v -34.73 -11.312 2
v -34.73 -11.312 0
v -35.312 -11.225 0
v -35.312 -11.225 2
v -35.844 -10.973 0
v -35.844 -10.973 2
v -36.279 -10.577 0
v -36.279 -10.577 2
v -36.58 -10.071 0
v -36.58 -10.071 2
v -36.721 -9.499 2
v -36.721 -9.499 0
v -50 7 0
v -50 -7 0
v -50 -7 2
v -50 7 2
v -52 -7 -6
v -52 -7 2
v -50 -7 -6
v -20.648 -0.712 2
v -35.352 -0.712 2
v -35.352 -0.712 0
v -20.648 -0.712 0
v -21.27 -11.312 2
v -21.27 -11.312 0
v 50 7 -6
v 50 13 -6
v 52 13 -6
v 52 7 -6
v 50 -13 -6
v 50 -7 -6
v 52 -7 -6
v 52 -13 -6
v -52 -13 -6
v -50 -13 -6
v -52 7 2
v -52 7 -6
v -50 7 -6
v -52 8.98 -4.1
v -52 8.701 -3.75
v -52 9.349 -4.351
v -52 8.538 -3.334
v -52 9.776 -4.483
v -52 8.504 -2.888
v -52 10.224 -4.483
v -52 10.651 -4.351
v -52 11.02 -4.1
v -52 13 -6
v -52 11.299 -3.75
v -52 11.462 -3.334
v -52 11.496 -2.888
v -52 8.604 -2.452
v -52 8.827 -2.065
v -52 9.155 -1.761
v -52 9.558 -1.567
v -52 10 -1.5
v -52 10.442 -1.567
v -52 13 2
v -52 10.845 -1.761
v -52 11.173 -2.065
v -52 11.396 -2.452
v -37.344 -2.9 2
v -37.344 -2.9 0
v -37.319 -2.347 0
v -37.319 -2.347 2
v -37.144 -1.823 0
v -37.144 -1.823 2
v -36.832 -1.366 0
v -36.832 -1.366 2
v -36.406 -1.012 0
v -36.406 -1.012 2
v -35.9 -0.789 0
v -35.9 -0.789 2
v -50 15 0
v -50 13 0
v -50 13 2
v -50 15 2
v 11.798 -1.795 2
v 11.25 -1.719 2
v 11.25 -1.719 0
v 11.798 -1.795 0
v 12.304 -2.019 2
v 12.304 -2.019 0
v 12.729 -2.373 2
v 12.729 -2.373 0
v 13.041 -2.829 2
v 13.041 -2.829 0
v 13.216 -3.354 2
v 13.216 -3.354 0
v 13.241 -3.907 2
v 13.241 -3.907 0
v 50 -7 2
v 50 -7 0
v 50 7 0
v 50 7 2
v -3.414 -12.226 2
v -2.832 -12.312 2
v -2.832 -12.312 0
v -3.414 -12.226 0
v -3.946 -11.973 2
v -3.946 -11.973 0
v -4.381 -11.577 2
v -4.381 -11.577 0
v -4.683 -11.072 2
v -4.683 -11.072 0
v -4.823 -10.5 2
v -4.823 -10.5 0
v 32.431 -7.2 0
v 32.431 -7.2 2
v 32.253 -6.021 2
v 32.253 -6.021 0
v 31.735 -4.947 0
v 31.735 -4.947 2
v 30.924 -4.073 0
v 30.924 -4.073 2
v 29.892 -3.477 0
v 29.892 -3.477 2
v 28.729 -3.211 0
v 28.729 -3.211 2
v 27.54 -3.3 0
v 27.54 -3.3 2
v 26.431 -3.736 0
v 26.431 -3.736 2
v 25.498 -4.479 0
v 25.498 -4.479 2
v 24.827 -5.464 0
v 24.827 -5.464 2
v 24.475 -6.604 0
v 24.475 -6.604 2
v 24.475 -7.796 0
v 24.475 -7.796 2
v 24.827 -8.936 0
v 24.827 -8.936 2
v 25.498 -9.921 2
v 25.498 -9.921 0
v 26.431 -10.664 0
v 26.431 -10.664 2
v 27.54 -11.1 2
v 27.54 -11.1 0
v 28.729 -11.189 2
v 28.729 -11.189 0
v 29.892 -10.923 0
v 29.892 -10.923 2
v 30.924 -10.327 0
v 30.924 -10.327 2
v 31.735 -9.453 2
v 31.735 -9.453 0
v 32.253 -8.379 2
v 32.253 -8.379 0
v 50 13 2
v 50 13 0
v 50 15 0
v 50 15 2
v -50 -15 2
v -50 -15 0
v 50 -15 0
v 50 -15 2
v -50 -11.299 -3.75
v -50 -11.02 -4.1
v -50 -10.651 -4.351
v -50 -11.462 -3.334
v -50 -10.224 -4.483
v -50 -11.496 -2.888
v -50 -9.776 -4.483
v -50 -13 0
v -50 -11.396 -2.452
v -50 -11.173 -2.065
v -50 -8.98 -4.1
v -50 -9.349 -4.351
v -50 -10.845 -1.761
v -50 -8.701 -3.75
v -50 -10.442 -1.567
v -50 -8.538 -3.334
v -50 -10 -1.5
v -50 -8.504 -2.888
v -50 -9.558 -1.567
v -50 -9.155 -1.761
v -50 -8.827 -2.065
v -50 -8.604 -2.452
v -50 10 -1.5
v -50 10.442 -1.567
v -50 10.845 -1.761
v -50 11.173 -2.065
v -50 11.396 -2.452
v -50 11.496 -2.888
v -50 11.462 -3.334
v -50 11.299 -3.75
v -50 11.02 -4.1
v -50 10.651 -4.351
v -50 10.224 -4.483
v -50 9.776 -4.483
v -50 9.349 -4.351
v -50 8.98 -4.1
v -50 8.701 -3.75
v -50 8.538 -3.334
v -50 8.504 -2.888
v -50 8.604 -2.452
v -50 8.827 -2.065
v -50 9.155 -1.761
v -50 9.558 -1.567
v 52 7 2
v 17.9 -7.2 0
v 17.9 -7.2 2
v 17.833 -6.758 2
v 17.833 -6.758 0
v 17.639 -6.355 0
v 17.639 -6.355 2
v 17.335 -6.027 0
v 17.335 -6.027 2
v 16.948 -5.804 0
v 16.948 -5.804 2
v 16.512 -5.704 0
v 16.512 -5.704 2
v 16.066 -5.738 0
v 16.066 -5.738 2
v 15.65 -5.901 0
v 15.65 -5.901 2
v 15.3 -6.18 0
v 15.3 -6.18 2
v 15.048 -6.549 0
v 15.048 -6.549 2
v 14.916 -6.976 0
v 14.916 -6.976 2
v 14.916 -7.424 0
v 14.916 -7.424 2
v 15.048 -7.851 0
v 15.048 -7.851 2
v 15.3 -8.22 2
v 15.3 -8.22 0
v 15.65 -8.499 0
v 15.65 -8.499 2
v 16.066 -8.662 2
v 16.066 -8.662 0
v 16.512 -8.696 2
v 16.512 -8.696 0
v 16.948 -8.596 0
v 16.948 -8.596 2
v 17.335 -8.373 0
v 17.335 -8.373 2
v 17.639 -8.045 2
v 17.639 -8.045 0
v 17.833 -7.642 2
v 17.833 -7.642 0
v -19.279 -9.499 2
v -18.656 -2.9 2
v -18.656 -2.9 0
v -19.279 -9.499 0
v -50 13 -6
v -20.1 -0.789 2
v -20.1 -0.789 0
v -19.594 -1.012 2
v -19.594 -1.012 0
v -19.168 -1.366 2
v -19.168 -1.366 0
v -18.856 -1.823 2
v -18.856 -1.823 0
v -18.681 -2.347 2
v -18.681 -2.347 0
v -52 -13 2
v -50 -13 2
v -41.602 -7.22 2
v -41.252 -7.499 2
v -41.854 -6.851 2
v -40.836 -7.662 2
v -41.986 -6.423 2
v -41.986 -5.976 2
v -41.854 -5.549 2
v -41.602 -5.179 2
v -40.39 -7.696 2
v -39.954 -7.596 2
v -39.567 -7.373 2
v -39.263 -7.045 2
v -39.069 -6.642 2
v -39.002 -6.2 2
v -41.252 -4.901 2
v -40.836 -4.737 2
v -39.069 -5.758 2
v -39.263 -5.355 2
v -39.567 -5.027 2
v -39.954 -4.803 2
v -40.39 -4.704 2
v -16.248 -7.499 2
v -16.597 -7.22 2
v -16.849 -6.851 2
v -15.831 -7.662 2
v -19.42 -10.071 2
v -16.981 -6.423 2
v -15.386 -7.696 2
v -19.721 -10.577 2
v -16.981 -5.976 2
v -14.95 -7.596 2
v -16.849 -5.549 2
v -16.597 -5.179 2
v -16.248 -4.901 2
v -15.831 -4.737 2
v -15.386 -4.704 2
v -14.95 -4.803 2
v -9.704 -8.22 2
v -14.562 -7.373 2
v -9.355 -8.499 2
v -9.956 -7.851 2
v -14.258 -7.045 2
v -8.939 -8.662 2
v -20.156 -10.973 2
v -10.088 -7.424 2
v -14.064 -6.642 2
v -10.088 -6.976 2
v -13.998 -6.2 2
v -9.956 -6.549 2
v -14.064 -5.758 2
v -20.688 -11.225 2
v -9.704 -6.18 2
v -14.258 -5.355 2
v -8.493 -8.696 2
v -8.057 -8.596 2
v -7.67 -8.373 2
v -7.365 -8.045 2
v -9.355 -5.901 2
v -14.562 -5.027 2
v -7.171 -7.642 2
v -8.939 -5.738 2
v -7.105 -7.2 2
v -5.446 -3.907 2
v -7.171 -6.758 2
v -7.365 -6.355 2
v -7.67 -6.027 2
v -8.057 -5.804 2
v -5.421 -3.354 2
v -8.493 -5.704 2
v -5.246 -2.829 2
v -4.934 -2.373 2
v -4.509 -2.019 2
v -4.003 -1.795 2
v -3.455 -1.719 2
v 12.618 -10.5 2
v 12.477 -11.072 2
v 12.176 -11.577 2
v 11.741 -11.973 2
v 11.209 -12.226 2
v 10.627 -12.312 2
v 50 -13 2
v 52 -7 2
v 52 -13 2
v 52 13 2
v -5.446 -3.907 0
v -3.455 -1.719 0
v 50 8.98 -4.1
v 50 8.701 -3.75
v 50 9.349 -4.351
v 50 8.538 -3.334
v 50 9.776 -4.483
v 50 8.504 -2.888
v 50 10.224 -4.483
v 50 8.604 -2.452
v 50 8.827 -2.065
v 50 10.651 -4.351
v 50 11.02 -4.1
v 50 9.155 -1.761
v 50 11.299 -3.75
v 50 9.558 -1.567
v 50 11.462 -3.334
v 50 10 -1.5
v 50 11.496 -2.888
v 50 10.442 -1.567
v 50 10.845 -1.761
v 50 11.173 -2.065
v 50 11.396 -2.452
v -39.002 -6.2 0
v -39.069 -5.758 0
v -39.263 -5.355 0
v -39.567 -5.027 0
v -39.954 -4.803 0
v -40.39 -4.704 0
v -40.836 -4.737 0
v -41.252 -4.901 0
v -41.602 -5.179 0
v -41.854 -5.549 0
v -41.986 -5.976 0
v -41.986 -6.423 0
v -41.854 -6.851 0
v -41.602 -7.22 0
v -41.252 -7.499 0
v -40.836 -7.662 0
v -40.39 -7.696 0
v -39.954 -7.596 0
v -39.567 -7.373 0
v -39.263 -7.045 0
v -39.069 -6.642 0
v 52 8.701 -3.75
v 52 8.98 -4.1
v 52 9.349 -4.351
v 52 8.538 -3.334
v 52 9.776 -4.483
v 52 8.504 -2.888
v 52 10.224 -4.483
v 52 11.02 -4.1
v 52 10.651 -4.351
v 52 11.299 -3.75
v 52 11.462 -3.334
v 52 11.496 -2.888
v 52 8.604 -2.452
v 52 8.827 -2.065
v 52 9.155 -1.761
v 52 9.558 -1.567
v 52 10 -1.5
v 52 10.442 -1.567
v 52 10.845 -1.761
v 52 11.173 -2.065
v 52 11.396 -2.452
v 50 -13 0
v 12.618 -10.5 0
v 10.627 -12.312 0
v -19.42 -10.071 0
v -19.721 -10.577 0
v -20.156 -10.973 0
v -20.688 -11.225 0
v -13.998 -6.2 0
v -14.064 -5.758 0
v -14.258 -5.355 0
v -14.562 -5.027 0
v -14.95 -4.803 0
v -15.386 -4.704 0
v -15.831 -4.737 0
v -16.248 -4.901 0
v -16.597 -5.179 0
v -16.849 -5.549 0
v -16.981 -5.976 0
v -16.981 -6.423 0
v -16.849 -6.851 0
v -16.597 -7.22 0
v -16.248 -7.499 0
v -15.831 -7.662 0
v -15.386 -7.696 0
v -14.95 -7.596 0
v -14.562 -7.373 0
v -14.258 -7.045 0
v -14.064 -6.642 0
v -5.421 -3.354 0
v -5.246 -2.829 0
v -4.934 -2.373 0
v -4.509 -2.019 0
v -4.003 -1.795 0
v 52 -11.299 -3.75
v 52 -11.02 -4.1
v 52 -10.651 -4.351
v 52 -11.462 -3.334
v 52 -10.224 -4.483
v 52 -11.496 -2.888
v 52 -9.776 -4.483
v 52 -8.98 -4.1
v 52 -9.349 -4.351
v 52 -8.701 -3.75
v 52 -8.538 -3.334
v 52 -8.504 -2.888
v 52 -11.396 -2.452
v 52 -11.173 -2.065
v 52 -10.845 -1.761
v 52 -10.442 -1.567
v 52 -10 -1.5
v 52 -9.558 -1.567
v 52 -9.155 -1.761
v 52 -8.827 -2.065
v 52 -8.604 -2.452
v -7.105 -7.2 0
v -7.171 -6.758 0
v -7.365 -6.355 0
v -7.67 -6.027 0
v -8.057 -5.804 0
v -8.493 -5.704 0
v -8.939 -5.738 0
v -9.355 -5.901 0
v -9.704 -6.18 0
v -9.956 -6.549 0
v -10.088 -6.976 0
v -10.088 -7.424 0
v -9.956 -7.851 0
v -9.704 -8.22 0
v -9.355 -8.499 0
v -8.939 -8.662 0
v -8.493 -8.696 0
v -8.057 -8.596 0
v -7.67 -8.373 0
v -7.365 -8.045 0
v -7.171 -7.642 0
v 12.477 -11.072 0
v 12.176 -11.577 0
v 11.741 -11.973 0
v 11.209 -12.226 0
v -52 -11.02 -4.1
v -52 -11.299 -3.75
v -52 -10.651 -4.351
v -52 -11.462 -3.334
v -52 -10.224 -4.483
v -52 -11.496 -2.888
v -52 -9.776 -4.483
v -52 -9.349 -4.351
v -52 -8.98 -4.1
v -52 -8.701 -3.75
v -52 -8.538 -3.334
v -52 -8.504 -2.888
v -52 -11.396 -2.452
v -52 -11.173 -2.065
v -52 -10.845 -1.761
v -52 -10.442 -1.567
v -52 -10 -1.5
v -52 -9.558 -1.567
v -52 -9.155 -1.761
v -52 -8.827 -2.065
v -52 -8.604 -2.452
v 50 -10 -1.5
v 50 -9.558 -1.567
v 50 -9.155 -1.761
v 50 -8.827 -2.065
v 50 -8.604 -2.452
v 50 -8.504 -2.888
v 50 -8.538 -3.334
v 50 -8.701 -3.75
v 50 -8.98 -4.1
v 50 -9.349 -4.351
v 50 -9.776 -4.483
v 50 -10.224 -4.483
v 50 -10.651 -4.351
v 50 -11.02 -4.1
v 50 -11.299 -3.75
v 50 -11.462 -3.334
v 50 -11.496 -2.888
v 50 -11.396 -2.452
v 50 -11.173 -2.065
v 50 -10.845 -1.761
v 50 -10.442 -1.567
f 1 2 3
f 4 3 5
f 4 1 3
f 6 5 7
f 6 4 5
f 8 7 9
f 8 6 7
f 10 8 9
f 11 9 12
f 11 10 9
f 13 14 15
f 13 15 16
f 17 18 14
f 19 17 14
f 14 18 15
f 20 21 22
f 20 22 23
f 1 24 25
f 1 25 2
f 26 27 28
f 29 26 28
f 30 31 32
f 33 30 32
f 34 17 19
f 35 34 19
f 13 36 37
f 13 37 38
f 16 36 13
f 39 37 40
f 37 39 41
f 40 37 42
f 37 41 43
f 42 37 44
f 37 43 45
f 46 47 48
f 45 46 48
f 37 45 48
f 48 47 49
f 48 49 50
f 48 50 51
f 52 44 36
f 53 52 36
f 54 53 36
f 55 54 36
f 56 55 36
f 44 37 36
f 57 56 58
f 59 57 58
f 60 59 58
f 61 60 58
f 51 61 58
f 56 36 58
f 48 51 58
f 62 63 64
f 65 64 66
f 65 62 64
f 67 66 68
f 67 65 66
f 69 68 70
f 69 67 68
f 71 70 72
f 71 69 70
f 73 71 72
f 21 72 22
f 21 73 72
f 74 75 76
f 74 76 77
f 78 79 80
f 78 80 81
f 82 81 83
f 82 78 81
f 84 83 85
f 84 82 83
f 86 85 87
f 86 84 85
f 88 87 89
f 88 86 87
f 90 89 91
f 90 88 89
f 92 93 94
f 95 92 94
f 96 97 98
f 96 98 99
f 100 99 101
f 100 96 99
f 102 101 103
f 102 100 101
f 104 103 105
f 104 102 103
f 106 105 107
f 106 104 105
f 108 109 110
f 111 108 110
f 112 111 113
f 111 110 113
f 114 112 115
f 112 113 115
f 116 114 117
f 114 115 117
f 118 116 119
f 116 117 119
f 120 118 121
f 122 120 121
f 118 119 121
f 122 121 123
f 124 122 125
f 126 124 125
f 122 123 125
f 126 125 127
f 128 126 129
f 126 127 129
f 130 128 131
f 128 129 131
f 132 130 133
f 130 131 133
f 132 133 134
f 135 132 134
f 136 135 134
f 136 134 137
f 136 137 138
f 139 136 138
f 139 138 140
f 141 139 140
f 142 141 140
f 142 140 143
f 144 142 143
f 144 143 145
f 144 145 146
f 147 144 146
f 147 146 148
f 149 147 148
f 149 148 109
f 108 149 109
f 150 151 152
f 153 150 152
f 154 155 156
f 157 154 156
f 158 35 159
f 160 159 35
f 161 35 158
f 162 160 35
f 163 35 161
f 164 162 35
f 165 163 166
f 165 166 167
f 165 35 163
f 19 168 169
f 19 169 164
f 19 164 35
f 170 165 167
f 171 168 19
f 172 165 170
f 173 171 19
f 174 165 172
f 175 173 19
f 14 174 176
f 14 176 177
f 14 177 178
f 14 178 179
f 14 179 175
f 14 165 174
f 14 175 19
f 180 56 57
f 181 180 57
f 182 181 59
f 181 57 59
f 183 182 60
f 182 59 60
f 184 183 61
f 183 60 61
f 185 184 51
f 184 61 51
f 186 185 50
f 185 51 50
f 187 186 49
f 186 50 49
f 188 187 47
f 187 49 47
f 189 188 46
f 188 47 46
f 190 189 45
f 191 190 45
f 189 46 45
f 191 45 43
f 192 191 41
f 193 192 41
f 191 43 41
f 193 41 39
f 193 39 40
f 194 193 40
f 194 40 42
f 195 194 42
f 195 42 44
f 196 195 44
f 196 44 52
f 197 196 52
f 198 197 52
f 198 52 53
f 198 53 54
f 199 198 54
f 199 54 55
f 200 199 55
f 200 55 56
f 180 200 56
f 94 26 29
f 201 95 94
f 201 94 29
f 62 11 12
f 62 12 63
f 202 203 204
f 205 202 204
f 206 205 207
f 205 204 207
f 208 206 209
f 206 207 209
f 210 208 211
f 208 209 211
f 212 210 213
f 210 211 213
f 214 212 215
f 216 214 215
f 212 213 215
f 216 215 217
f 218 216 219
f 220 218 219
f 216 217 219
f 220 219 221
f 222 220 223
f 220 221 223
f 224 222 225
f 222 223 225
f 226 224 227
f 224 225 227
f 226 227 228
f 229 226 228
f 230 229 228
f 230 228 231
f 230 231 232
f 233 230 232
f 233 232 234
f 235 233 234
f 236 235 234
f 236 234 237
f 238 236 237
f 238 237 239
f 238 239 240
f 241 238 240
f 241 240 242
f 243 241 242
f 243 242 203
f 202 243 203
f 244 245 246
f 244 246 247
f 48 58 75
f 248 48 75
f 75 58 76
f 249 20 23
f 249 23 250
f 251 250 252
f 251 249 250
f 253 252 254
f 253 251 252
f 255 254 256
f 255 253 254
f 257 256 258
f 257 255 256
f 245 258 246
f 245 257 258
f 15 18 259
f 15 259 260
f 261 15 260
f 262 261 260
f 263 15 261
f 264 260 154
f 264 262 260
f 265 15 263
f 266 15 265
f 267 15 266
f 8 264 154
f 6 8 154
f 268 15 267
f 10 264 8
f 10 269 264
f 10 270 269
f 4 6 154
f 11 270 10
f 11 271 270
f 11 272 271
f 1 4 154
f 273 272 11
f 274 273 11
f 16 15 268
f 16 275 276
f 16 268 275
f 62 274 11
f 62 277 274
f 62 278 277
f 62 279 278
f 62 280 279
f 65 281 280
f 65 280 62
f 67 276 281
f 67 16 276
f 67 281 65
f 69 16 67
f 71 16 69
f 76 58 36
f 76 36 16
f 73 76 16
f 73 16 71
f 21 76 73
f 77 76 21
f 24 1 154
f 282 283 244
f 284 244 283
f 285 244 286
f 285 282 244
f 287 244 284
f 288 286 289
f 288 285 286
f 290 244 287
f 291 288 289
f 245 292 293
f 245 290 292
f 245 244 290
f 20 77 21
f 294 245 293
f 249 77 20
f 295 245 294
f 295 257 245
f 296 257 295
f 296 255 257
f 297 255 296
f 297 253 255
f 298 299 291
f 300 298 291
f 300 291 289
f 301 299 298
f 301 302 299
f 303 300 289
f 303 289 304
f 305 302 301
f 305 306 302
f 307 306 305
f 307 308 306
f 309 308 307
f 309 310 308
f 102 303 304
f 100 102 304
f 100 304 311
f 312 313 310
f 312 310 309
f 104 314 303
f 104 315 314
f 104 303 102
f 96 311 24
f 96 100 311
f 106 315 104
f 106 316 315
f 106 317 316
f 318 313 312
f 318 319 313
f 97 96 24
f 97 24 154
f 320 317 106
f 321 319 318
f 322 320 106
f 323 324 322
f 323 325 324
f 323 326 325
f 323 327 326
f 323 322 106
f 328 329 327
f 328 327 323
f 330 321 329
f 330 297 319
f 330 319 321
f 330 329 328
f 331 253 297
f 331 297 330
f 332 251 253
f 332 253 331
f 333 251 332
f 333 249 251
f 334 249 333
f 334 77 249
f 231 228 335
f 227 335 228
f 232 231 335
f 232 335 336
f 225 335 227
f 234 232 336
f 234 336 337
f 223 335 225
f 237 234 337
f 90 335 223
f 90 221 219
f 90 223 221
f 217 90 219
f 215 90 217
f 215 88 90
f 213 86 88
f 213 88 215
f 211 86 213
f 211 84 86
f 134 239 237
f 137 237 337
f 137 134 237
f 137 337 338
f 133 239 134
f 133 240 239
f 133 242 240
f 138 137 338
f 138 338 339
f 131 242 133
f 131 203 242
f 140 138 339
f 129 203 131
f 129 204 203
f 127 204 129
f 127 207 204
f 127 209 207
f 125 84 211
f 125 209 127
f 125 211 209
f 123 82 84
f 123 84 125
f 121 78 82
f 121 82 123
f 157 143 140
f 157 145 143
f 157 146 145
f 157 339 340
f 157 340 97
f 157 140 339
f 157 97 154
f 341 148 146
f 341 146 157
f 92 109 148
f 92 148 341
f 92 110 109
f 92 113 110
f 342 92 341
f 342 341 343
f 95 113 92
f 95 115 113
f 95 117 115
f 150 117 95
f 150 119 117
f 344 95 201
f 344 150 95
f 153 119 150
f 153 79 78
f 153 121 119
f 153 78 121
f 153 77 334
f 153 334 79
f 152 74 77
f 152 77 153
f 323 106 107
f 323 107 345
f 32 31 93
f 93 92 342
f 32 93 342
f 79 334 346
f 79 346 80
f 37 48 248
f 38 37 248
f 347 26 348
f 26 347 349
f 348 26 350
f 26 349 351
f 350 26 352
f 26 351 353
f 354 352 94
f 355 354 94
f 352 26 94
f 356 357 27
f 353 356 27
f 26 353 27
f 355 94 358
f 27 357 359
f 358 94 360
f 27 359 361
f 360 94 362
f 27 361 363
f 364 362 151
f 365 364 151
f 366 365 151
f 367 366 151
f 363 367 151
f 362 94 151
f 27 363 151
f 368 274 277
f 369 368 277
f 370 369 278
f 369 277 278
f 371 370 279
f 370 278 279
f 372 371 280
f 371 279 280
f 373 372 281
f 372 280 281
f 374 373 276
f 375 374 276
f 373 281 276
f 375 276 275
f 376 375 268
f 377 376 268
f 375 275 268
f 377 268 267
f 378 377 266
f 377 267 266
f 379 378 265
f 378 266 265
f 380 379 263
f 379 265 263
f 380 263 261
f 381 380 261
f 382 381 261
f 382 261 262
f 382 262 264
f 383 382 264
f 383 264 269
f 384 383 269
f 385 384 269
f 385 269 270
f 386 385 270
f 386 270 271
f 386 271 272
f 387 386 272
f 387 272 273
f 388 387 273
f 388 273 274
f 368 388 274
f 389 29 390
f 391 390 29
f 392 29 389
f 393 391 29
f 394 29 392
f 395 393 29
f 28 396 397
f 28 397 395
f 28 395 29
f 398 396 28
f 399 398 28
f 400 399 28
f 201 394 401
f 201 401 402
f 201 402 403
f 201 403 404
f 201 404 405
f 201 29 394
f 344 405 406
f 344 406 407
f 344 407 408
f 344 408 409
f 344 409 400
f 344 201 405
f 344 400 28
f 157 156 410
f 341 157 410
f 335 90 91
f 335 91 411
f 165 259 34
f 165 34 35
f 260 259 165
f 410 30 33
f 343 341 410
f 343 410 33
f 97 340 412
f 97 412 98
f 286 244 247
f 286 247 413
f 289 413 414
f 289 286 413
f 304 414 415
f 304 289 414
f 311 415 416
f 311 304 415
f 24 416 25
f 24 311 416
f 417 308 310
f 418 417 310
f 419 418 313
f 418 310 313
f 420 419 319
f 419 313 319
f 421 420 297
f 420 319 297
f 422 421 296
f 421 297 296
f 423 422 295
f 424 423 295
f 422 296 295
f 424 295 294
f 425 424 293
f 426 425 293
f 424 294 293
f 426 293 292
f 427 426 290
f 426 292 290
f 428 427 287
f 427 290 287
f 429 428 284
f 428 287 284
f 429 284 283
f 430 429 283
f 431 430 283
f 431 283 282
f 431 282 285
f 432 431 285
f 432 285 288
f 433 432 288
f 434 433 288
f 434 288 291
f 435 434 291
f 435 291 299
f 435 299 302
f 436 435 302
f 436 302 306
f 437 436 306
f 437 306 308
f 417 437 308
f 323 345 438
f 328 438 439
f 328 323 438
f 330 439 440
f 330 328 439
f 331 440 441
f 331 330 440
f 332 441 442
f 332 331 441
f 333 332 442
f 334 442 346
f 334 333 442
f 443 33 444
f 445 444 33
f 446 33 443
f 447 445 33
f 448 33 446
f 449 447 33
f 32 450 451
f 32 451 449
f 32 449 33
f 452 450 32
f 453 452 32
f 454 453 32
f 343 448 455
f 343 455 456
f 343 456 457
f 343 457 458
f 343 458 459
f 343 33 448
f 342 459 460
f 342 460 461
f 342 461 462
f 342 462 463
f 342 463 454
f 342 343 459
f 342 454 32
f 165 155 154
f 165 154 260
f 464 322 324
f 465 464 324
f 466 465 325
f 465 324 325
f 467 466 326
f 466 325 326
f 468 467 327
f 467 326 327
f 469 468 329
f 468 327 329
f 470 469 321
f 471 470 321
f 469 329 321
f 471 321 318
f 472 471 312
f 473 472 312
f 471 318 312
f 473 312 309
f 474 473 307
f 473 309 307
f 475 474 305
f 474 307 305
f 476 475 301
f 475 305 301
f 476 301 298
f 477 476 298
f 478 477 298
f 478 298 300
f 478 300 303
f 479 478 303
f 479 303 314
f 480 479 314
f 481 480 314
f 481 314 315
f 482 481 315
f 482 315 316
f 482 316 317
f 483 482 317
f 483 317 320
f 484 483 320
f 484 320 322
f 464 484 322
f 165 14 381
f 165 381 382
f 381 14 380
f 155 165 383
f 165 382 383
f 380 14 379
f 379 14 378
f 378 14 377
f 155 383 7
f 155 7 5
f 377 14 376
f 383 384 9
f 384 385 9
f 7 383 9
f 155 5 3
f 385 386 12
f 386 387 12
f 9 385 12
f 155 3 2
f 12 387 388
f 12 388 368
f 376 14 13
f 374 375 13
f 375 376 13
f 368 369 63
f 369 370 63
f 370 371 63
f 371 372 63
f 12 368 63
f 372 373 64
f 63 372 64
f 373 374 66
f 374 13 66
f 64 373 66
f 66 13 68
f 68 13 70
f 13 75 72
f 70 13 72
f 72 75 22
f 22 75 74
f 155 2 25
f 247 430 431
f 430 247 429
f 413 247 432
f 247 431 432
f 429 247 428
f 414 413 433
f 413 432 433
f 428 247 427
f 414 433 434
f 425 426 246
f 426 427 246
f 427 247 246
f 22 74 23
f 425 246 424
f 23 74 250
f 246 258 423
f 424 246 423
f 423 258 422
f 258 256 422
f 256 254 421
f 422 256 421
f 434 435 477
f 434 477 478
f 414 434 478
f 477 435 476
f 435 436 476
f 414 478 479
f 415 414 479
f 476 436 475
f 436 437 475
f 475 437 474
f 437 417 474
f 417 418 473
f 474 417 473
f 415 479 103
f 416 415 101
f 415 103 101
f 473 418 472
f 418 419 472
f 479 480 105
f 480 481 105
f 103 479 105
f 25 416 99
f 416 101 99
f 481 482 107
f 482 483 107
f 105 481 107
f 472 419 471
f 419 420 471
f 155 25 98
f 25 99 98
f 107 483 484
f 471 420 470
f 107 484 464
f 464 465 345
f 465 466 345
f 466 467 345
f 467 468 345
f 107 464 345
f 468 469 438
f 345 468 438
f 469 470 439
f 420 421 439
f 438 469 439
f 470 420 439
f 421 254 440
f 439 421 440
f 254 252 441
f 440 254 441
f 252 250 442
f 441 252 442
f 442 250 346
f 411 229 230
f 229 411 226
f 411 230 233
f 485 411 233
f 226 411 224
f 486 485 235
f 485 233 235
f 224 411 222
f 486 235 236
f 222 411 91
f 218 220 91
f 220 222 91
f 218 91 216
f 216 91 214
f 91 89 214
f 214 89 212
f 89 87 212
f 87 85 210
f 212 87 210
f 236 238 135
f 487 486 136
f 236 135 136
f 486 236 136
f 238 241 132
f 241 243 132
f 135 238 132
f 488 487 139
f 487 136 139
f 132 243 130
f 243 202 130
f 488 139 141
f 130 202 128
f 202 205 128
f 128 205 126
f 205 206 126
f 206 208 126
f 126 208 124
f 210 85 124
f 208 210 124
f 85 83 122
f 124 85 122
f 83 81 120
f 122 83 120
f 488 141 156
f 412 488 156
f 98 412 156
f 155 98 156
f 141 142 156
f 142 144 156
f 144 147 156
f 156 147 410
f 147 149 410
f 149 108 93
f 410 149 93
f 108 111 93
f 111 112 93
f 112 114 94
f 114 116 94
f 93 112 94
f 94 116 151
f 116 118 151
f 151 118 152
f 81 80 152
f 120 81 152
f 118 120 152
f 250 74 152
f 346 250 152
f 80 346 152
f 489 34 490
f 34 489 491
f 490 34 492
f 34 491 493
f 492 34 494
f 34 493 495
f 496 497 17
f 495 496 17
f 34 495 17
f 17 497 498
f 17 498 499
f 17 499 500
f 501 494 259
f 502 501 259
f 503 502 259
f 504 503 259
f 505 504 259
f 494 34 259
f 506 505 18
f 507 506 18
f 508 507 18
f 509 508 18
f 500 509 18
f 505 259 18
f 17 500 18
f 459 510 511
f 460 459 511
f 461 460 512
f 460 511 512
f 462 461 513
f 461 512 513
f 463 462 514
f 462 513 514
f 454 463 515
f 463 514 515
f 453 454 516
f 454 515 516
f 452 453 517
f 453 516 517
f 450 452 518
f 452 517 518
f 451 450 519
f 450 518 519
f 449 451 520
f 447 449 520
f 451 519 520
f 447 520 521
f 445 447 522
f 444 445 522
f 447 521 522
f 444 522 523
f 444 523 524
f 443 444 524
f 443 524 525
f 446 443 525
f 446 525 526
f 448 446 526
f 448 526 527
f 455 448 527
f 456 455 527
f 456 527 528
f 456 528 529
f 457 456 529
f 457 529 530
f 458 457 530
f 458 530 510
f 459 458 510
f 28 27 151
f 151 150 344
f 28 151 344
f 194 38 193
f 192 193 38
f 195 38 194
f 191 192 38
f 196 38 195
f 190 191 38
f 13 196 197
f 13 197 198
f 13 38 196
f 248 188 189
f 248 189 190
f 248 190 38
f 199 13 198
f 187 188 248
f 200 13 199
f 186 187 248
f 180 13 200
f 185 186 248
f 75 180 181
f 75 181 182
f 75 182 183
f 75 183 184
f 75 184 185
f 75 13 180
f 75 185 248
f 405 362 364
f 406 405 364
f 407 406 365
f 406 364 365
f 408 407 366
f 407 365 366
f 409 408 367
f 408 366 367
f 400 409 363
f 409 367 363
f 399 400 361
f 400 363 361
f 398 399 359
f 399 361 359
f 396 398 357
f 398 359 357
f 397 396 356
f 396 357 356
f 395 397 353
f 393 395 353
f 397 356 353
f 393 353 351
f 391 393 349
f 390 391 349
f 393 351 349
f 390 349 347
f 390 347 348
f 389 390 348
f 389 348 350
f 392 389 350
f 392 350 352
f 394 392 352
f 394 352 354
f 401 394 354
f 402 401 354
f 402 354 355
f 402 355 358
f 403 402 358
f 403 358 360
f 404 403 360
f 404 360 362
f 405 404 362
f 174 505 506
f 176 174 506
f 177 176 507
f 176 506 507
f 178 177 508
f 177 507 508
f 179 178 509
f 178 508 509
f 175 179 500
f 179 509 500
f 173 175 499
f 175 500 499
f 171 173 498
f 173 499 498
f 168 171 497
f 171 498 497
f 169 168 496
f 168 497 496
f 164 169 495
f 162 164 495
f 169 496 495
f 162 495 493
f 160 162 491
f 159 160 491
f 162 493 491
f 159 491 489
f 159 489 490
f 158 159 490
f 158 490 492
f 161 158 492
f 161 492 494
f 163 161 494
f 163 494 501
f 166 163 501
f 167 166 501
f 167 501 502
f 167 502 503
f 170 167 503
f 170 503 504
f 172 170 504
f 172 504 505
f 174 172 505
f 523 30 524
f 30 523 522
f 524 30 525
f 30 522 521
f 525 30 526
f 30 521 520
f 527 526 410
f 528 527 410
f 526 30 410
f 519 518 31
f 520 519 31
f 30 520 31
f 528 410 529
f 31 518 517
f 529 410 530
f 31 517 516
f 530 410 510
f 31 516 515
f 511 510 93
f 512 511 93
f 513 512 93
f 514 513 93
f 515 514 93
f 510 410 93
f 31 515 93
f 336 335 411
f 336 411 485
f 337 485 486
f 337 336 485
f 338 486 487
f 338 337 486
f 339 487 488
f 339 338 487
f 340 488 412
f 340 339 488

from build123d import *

# Parameters (mm, degrees)
SKETCH1_W           = 100
SKETCH1_H           = 30
BOSS_EXTRUDE1_DEPTH = 2
SKETCH2_W           = 2
SKETCH2_H           = 6
BOSS_EXTRUDE2_DEPTH = 8
SKETCH3_R           = 1.5
CUT_EXTRUDE1_DEPTH  = 105
CUT_EXTRUDE2_REACH  = 10
SKETCH4_R           = 1.5
SKETCH4_R_2         = 4


with BuildPart() as part:
    # Sketch1 → Boss-Extrude1 (new body)
    with BuildSketch(Plane.XY):
        Rectangle(SKETCH1_W, SKETCH1_H)
    extrude(amount=BOSS_EXTRUDE1_DEPTH)

    # Sketch2 → Boss-Extrude2 (add)
    with BuildSketch(Plane.XY.offset(2)):
        with Locations((-51, 10)):
            Rectangle(SKETCH2_W, SKETCH2_H)
        with Locations((-51, -10)):
            Rectangle(SKETCH2_W, SKETCH2_H)
        with Locations((51, 10)):
            Rectangle(SKETCH2_W, SKETCH2_H)
        with Locations((51, -10)):
            Rectangle(SKETCH2_W, SKETCH2_H)
    extrude(amount=-BOSS_EXTRUDE2_DEPTH)

    # Sketch3 → Cut-Extrude1 (cut, through all)
    with BuildSketch(Plane.ZY.offset(52)):
        with Locations((-3, 10)):
            Circle(SKETCH3_R)
        with Locations((-3, -10)):
            Circle(SKETCH3_R)
    extrude(amount=-CUT_EXTRUDE1_DEPTH, mode=Mode.SUBTRACT)

    # Sketch4 → Cut-Extrude2 (cut, up to next)
    with BuildSketch(Plane.XY.offset(2), mode=Mode.PRIVATE) as cut_extrude2_sk1:
        with Locations((-40.502306205, -6.199754272)):
            Circle(SKETCH4_R)
    cut_extrude2_tool1 = extrude(cut_extrude2_sk1.sketch, amount=-CUT_EXTRUDE2_REACH, mode=Mode.PRIVATE) & part.part
    add(cut_extrude2_tool1.solids().sort_by_distance((-40.502306, -6.199754, 2))[0], mode=Mode.SUBTRACT)
    # Sketch4 → Cut-Extrude2 (cut, up to next)
    with BuildSketch(Plane.XY.offset(2), mode=Mode.PRIVATE) as cut_extrude2_sk2:
        with Locations((-15.497693795, -6.199754272)):
            Circle(SKETCH4_R)
    cut_extrude2_tool2 = extrude(cut_extrude2_sk2.sketch, amount=-CUT_EXTRUDE2_REACH, mode=Mode.PRIVATE) & part.part
    add(cut_extrude2_tool2.solids().sort_by_distance((-15.497694, -6.199754, 2))[0], mode=Mode.SUBTRACT)
    # Sketch4 → Cut-Extrude2 (cut, up to next)
    with BuildSketch(Plane.XY.offset(2), mode=Mode.PRIVATE) as cut_extrude2_sk3:
        with Locations((-8.604808795, -7.2)):
            Circle(SKETCH4_R)
    cut_extrude2_tool3 = extrude(cut_extrude2_sk3.sketch, amount=-CUT_EXTRUDE2_REACH, mode=Mode.PRIVATE) & part.part
    add(cut_extrude2_tool3.solids().sort_by_distance((-8.604809, -7.2, 2))[0], mode=Mode.SUBTRACT)
    # Sketch4 → Cut-Extrude2 (cut, up to next)
    with BuildSketch(Plane.XY.offset(2), mode=Mode.PRIVATE) as cut_extrude2_sk4:
        with Locations((16.399709937, -7.2)):
            Circle(SKETCH4_R)
    cut_extrude2_tool4 = extrude(cut_extrude2_sk4.sketch, amount=-CUT_EXTRUDE2_REACH, mode=Mode.PRIVATE) & part.part
    add(cut_extrude2_tool4.solids().sort_by_distance((16.39971, -7.2, 2))[0], mode=Mode.SUBTRACT)
    # Sketch4 → Cut-Extrude2 (cut, up to next)
    with BuildSketch(Plane.XY.offset(2), mode=Mode.PRIVATE) as cut_extrude2_sk5:
        with Locations((28.430538533, -7.2)):
            Circle(SKETCH4_R_2)
    cut_extrude2_tool5 = extrude(cut_extrude2_sk5.sketch, amount=-CUT_EXTRUDE2_REACH, mode=Mode.PRIVATE) & part.part
    add(cut_extrude2_tool5.solids().sort_by_distance((28.430539, -7.2, 2))[0], mode=Mode.SUBTRACT)
    # Sketch4 → Cut-Extrude2 (cut, up to next)
    with BuildSketch(Plane.XY.offset(2), mode=Mode.PRIVATE) as cut_extrude2_sk6:
        with BuildLine():
            Line((-35.352440505, -0.712200048), (-20.647559495, -0.712200048))
            ThreePointArc((-20.647559495, -0.712200048), (-19.168422859, -1.366037052), (-18.65640049, -2.900045237))
            Line((-18.65640049, -2.900045237), (-19.2789871, -9.499463306))
            ThreePointArc((-19.2789871, -9.499463306), (-19.92398311, -10.790754753), (-21.270146105, -11.311618117))
            Line((-21.270146105, -11.311618117), (-34.729853895, -11.311618117))
            ThreePointArc((-34.729853895, -11.311618117), (-36.07601689, -10.790754753), (-36.7210129, -9.499463306))
            Line((-36.7210129, -9.499463306), (-37.34359951, -2.900045237))
            ThreePointArc((-37.34359951, -2.900045237), (-36.831577141, -1.366037052), (-35.352440505, -0.712200048))
        make_face()
    cut_extrude2_tool6 = extrude(cut_extrude2_sk6.sketch, amount=-CUT_EXTRUDE2_REACH, mode=Mode.PRIVATE) & part.part
    add(cut_extrude2_tool6.solids().sort_by_distance((-28, -5.931102, 2))[0], mode=Mode.SUBTRACT)
    # Sketch4 → Cut-Extrude2 (cut, up to next)
    with BuildSketch(Plane.XY.offset(2), mode=Mode.PRIVATE) as cut_extrude2_sk7:
        with BuildLine():
            Line((-3.454989934, -1.718769673), (11.249891076, -1.718769673))
            ThreePointArc((11.249891076, -1.718769673), (12.729090854, -2.372676058), (13.241032451, -3.906801654))
            Line((13.241032451, -3.906801654), (12.618390941, -10.500186773))
            ThreePointArc((12.618390941, -10.500186773), (11.973343181, -11.791354569), (10.627249567, -12.312154791))
            Line((10.627249567, -12.312154791), (-2.832348424, -12.312154791))
            ThreePointArc((-2.832348424, -12.312154791), (-4.178442039, -11.791354569), (-4.823489799, -10.500186773))
            Line((-4.823489799, -10.500186773), (-5.446131309, -3.906801654))
            ThreePointArc((-5.446131309, -3.906801654), (-4.934189711, -2.372676058), (-3.454989934, -1.718769673))
        make_face()
    cut_extrude2_tool7 = extrude(cut_extrude2_sk7.sketch, amount=-CUT_EXTRUDE2_REACH, mode=Mode.PRIVATE) & part.part
    add(cut_extrude2_tool7.solids().sort_by_distance((3.897451, -6.934685, 2))[0], mode=Mode.SUBTRACT)


solid = part.part
